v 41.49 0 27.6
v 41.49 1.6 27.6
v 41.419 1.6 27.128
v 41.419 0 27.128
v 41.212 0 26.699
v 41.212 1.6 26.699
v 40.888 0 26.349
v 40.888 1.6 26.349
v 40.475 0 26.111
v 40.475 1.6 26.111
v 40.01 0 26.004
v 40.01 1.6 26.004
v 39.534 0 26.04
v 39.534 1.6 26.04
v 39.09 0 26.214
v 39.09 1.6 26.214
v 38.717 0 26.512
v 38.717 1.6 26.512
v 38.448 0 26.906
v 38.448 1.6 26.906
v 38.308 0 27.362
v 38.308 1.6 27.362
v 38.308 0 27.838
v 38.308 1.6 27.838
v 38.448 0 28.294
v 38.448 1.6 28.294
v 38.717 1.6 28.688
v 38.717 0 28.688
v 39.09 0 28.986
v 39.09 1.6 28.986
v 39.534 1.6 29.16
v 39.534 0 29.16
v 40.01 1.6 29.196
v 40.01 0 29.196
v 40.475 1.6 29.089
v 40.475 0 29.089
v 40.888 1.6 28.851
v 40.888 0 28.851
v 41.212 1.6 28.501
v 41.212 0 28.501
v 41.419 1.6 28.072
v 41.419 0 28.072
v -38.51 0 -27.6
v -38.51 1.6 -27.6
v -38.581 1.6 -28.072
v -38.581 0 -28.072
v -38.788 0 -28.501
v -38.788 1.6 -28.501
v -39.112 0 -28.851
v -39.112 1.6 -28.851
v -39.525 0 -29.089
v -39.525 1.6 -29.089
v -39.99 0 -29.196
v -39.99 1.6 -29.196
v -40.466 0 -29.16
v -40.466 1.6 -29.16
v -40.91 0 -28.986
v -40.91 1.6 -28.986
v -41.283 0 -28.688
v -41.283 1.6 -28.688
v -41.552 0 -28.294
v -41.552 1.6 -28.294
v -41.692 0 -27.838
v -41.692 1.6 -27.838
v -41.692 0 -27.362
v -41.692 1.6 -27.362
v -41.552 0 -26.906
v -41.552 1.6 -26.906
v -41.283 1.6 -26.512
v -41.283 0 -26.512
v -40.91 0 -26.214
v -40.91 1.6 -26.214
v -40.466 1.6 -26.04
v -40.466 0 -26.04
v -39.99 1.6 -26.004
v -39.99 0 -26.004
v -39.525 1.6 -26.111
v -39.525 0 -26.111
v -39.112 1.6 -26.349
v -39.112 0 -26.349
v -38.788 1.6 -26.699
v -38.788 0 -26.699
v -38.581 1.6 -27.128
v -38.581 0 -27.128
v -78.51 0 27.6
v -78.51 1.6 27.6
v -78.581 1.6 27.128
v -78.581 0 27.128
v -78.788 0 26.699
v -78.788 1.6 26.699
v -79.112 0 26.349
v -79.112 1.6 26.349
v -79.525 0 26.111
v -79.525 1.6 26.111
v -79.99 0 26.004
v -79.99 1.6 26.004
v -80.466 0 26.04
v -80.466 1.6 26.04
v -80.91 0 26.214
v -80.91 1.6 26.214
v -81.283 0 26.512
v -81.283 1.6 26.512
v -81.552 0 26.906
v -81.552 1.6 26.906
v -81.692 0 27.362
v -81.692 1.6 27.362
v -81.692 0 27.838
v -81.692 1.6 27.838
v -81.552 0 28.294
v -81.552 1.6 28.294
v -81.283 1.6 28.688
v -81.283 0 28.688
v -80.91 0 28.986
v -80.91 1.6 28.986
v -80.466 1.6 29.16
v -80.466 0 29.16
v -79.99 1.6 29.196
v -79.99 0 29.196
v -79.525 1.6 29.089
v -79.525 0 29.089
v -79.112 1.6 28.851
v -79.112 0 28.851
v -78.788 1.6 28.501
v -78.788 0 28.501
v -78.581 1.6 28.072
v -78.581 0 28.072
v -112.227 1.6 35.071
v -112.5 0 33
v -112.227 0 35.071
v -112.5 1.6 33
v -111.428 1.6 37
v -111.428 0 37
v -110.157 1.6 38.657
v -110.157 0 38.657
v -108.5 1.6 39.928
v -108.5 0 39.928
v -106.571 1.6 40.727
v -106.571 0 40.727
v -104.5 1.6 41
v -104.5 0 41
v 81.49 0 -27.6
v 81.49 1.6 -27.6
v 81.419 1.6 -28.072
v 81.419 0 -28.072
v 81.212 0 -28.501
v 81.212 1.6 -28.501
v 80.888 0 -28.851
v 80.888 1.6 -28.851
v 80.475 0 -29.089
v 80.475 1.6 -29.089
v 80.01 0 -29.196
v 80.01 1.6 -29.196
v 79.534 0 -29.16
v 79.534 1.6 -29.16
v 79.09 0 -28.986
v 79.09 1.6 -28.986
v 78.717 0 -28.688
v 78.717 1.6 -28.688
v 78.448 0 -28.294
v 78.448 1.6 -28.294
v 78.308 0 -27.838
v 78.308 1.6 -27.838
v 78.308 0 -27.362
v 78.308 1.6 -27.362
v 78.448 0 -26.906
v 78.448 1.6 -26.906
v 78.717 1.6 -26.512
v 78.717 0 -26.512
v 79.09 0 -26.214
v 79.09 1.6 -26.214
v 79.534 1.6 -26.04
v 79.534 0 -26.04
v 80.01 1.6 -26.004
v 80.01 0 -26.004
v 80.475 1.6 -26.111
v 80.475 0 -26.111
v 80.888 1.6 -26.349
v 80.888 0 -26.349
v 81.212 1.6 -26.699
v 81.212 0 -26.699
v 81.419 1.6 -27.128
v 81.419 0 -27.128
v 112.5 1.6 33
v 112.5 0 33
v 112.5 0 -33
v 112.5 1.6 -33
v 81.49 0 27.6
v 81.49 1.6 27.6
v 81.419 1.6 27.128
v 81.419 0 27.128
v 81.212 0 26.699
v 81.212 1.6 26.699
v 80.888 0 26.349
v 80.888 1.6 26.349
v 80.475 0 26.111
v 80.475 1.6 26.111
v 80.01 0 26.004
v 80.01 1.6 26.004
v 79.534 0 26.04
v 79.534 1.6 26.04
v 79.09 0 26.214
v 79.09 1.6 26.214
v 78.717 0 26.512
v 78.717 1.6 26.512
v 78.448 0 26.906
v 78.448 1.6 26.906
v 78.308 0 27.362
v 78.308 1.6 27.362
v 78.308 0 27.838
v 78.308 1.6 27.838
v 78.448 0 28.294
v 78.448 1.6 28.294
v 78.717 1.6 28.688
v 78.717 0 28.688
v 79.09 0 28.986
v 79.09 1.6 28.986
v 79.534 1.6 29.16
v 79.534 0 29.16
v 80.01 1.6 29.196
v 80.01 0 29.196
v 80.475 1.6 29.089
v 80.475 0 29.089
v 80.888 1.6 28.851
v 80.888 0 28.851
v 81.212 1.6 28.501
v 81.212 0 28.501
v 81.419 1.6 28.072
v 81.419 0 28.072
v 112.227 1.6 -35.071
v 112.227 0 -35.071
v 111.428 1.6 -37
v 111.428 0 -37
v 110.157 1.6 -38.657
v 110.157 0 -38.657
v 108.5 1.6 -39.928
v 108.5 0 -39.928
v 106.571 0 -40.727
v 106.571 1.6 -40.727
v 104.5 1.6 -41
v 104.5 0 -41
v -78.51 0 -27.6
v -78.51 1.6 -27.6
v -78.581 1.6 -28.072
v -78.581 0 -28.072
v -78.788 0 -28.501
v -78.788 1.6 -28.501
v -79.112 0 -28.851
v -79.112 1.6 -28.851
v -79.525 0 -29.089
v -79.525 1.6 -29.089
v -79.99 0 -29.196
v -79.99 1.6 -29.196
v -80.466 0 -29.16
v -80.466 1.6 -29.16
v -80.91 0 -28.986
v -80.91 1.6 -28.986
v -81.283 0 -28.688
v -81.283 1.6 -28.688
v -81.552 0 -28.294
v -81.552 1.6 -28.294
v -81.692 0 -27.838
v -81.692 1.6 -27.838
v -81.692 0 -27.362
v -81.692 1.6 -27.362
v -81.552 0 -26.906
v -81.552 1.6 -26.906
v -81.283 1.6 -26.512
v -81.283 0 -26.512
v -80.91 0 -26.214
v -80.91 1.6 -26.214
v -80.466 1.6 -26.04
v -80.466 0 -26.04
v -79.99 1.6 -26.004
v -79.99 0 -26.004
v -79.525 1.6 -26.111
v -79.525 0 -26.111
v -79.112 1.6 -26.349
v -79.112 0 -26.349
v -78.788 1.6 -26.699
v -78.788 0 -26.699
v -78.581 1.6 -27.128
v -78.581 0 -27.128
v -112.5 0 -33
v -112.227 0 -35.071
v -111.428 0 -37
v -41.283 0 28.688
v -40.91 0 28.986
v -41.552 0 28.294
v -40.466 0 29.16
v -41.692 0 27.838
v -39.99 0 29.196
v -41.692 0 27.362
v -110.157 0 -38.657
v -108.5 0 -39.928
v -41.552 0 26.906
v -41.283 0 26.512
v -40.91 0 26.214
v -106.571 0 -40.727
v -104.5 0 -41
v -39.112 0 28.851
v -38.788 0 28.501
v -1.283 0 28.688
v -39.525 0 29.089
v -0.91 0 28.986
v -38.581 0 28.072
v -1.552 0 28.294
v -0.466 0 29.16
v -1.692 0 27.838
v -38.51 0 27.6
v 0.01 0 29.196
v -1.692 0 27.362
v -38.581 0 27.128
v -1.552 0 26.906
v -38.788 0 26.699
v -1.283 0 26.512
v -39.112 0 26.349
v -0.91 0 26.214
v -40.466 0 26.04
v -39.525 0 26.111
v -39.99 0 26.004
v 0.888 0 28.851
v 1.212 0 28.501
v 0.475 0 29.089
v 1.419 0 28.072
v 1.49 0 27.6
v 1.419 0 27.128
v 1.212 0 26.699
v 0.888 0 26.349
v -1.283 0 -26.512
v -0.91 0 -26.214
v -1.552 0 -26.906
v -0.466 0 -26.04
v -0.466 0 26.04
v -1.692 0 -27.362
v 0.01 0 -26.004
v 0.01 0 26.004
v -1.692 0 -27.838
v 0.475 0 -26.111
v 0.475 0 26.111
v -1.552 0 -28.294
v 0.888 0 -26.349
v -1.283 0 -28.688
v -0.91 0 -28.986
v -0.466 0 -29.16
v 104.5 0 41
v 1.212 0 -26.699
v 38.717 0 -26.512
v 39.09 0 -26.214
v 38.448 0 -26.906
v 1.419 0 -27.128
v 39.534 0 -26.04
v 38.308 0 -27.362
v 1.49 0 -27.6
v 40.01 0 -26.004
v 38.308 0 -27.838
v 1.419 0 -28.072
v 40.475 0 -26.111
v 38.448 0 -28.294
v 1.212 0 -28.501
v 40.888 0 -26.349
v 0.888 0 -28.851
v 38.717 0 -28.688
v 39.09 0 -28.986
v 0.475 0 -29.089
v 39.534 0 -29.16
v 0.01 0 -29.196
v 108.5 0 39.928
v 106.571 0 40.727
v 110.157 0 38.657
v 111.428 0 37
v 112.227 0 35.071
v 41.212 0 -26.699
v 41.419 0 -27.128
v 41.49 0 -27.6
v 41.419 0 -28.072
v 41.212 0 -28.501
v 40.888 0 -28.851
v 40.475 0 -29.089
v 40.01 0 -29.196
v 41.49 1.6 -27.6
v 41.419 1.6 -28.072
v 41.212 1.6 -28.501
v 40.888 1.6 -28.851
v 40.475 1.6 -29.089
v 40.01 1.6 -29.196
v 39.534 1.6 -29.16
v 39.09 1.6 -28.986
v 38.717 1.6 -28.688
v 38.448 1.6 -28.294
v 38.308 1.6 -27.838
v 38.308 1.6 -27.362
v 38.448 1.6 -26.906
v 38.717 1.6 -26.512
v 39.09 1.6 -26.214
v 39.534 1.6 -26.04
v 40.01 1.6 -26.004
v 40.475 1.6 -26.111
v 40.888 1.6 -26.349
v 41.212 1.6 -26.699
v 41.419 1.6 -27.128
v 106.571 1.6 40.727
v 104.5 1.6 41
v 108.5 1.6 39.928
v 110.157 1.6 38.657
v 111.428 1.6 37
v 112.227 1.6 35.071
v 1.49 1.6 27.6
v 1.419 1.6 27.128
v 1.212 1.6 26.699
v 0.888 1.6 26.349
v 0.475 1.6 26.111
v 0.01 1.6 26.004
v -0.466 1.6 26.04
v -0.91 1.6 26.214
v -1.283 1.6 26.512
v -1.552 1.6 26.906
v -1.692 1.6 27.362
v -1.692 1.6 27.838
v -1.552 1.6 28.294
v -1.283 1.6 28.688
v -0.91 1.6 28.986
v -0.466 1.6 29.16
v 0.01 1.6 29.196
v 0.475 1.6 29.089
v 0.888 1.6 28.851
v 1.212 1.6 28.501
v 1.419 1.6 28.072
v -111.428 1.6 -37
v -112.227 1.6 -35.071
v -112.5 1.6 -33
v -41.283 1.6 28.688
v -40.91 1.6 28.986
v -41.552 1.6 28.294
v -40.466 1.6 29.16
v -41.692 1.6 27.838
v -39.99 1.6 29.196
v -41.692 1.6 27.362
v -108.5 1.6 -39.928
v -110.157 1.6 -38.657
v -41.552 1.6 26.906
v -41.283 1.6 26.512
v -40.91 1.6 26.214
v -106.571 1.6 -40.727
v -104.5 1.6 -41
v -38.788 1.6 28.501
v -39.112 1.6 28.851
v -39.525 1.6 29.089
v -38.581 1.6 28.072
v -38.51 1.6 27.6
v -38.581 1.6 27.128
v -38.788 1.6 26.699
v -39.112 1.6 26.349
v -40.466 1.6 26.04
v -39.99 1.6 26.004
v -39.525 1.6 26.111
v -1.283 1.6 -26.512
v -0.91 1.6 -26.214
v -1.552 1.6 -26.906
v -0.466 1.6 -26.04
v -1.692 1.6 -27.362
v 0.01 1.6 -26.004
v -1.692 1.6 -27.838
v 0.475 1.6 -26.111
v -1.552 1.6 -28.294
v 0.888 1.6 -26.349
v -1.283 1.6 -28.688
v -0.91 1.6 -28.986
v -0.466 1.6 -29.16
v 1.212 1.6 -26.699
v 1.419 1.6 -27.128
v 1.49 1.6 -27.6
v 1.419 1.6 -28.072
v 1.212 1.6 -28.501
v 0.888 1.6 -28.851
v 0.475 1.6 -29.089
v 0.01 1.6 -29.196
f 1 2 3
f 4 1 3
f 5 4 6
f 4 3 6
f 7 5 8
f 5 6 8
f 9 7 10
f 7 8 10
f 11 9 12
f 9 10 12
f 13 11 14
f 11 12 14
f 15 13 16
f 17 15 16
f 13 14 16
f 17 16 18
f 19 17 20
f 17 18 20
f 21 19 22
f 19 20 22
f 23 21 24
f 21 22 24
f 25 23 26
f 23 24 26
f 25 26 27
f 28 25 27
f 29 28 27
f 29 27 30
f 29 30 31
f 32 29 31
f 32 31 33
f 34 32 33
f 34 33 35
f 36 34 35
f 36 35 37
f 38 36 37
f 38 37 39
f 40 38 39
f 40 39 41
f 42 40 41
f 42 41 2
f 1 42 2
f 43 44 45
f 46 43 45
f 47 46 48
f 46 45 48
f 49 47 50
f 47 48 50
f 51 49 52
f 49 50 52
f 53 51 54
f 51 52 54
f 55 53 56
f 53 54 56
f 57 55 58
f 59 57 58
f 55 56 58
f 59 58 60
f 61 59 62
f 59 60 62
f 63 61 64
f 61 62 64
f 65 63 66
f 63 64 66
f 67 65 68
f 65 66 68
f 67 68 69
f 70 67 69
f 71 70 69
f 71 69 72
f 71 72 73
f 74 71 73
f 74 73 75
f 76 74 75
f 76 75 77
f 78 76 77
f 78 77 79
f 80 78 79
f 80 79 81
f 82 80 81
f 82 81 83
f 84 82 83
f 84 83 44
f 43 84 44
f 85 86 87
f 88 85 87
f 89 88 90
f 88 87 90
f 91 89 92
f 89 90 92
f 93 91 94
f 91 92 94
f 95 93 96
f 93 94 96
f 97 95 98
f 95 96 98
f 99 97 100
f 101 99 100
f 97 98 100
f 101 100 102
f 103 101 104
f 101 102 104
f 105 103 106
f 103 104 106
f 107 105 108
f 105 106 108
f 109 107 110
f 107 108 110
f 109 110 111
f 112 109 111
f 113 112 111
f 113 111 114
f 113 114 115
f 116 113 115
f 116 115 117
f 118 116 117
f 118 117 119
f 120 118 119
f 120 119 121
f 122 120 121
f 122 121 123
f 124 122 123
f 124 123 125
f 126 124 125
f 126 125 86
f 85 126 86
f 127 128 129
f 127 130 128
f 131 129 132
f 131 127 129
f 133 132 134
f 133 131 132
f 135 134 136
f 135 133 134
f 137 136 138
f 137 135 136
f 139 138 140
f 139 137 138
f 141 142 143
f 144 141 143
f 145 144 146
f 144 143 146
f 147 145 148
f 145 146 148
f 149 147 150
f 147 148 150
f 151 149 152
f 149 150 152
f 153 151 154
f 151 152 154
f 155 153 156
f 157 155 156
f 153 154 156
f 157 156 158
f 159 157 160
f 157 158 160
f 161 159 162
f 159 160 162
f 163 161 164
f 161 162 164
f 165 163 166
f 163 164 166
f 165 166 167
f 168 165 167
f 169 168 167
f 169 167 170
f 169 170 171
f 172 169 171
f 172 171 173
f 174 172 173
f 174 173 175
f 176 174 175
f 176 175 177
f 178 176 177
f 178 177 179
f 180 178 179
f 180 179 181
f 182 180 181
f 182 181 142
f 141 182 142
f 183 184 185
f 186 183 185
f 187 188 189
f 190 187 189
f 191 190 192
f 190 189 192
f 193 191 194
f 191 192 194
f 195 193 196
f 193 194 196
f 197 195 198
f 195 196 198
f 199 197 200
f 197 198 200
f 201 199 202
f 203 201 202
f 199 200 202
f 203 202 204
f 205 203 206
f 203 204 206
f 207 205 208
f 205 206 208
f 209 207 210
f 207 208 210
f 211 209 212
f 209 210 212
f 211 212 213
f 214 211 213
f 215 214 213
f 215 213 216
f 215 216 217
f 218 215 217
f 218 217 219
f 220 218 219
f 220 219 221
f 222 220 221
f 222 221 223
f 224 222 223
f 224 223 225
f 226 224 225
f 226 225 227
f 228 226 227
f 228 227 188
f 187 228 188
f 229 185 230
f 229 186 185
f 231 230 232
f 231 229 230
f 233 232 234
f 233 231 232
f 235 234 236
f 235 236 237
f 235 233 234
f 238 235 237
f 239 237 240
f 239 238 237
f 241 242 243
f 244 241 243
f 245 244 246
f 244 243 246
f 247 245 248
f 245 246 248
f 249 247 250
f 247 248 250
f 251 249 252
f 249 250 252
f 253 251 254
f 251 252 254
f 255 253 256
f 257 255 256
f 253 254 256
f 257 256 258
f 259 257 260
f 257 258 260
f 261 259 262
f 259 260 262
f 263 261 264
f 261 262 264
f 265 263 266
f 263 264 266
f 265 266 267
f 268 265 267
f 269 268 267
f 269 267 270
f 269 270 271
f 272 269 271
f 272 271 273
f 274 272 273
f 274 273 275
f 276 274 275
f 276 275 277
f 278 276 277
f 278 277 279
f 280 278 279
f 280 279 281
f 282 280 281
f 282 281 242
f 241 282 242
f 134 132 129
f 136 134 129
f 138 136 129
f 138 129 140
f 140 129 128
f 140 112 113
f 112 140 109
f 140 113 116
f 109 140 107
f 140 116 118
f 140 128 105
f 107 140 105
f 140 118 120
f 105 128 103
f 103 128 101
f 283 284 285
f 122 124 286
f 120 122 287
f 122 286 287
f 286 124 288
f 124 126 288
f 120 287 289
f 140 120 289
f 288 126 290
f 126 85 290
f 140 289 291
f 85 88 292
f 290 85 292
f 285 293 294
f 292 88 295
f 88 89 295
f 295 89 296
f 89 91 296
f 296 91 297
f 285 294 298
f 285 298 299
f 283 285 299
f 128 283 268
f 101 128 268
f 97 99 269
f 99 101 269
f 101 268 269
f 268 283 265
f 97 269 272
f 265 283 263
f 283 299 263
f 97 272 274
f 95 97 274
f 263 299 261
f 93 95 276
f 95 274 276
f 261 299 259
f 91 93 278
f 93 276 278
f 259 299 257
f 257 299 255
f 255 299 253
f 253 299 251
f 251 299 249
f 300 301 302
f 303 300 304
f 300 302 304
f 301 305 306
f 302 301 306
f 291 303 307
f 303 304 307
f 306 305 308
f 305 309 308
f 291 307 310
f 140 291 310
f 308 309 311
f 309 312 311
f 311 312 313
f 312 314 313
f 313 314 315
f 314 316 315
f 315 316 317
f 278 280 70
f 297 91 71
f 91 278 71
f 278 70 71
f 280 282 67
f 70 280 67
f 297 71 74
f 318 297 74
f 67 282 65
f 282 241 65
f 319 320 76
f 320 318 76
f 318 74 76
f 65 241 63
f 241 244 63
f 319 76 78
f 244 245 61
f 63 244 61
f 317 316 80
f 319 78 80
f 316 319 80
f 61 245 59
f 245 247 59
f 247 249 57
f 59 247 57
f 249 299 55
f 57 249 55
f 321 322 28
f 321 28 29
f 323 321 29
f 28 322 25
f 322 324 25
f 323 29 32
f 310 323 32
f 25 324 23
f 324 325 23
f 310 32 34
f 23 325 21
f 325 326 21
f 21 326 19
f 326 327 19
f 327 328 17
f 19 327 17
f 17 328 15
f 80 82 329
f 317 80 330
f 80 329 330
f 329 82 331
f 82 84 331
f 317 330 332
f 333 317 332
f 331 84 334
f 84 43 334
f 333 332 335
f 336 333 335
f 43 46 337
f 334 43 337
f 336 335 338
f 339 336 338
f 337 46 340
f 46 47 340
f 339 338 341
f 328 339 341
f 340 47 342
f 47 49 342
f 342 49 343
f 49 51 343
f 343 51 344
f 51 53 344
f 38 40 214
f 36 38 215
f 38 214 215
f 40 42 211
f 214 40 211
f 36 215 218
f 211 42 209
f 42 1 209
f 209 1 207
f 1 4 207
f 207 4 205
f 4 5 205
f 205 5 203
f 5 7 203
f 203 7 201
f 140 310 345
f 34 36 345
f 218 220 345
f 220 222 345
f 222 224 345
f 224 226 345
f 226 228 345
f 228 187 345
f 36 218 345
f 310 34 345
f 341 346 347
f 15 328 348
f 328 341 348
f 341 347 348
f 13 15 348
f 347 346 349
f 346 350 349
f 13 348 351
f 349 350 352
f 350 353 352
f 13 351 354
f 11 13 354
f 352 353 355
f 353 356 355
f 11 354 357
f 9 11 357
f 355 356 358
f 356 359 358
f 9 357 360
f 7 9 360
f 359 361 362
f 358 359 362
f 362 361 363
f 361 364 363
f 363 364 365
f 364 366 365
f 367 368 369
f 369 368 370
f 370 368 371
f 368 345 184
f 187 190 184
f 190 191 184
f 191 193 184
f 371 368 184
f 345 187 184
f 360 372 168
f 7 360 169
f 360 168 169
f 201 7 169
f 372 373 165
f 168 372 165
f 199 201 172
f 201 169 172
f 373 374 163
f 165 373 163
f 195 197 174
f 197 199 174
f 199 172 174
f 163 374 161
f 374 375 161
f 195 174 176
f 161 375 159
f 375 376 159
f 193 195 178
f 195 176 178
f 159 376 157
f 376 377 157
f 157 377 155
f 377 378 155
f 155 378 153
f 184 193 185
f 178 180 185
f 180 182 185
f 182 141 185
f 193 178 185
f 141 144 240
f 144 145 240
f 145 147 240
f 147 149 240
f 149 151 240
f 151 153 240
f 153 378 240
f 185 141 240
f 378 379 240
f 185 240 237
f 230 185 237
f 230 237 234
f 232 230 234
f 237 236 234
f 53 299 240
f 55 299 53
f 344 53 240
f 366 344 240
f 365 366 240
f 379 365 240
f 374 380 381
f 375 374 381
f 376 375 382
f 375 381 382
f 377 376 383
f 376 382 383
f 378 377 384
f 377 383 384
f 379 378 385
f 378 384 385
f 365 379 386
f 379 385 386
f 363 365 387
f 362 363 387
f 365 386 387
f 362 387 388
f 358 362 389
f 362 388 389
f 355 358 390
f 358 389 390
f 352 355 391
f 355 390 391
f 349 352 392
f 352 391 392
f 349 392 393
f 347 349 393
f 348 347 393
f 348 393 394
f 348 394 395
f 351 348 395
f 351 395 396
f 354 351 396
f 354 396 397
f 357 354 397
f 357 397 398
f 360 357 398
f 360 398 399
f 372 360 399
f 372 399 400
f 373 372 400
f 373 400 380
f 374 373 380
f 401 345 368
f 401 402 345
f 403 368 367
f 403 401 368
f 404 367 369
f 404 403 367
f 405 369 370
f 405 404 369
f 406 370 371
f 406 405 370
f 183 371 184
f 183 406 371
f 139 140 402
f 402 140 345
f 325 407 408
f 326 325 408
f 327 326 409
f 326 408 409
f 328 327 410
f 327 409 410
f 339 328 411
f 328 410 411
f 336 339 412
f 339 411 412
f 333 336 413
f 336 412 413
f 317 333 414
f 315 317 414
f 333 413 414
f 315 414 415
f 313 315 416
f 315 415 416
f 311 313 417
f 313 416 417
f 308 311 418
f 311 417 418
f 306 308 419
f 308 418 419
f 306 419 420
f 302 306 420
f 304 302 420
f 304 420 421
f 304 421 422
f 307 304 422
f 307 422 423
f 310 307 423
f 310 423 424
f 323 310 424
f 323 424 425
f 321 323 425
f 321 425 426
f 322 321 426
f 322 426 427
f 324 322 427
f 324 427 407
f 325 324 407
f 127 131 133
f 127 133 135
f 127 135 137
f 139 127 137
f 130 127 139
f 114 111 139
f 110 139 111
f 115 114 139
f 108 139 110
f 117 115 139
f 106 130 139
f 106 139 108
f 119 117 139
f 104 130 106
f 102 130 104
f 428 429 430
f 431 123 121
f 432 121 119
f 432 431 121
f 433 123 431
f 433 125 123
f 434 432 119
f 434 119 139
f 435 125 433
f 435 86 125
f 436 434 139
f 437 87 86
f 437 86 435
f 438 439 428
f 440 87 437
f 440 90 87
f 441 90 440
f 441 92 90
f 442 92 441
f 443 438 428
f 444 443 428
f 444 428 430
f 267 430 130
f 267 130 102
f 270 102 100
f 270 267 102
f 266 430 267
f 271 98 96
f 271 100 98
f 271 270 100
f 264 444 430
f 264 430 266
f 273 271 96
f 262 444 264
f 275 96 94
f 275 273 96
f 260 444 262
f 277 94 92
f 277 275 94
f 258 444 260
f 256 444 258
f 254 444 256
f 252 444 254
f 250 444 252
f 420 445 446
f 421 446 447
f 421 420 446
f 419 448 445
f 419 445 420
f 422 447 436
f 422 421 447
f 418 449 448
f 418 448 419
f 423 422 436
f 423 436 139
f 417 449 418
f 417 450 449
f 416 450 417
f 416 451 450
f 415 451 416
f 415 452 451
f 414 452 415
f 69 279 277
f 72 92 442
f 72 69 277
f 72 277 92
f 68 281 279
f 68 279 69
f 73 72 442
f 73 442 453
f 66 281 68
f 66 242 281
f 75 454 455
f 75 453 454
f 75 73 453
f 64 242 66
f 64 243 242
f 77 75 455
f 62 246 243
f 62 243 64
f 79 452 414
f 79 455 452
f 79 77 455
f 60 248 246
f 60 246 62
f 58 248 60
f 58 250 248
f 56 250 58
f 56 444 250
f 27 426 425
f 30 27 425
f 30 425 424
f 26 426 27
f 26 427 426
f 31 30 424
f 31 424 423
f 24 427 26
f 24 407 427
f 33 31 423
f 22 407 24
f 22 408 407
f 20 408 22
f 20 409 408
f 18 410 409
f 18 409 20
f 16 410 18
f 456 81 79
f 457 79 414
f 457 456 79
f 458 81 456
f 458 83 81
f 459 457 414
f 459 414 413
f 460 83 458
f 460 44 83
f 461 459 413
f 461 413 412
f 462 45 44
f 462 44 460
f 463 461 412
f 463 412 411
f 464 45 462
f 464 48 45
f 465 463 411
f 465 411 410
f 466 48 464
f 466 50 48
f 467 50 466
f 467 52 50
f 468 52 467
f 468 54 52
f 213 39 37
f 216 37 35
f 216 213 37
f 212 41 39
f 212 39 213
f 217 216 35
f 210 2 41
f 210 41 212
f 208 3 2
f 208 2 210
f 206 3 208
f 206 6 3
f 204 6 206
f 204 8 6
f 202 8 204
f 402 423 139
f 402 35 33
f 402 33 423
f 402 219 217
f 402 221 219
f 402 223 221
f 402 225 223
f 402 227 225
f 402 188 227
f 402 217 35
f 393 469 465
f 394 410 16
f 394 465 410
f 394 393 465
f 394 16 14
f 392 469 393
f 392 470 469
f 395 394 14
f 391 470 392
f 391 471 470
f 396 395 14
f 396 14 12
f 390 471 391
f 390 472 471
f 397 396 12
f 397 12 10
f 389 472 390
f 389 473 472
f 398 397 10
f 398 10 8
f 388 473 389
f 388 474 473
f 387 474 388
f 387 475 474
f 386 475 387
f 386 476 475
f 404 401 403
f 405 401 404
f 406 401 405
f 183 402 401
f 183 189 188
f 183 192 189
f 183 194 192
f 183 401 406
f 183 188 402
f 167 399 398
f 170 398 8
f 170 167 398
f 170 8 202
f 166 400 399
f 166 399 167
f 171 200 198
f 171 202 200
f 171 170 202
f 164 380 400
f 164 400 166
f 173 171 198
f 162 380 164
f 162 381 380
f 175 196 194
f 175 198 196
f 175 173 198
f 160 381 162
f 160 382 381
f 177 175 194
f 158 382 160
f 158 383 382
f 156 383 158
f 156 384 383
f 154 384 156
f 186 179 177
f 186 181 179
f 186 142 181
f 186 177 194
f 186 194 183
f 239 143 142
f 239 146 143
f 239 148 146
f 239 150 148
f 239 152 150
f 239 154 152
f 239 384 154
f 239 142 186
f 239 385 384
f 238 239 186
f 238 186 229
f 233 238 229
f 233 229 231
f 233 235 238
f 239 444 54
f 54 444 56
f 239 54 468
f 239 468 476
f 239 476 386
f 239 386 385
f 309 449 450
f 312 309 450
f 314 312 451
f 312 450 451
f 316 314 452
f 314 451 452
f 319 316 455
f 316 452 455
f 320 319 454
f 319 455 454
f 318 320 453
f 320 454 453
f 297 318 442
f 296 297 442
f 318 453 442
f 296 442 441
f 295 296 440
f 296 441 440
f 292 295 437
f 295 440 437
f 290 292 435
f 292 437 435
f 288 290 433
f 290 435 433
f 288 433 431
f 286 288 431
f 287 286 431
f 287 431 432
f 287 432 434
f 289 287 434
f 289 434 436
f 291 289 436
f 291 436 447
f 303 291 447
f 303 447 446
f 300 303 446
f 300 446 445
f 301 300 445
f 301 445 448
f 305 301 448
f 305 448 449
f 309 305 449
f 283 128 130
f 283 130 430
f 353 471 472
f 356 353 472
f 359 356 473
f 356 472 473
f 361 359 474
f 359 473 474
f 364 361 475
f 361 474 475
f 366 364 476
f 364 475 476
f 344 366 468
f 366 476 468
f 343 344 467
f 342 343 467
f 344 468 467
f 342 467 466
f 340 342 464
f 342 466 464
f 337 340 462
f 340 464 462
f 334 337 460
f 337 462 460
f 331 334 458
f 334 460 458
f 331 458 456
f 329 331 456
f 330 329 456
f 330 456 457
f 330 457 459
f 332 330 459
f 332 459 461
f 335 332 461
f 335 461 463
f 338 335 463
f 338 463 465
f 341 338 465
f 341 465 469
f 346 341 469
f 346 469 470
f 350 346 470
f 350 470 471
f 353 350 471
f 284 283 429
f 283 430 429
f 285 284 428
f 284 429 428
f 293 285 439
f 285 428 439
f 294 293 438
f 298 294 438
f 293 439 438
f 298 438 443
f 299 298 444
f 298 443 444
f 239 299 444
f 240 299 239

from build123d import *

# Parameters (mm, degrees)
SKETCH1_W               = 225
SKETCH1_H               = 82
BOSS_EXTRUDE1_DEPTH     = 1.6
FILLET1_R               = 8
SKETCH2_R               = 1.6
CUT_EXTRUDE1_DEPTH      = 1
CUT_EXTRUDE1_DEPTH_BACK = 2.6


with BuildPart() as part:
    # Sketch1 → Boss-Extrude1 (new body)
    with BuildSketch(Plane(origin=(0, 0, 0), x_dir=(1, 0, 0), z_dir=(0, 1, 0))):
        Rectangle(SKETCH1_W, SKETCH1_H)
    extrude(amount=BOSS_EXTRUDE1_DEPTH)

    # Fillet1
    fillet1_edges = [part.edges().sort_by_distance(p)[0] for p in [
        (112.5, 0.8, 41),
        (-112.5, 0.8, 41),
        (-112.5, 0.8, -41),
        (112.5, 0.8, -41),
    ]]
    fillet(fillet1_edges, radius=FILLET1_R)

    # Sketch2 → Cut-Extrude1 (cut, two sides)
    with BuildSketch(Plane(origin=(0, 1.6, 0), x_dir=(1, 0, 0), z_dir=(0, 1, 0))) as cut_extrude1_sk:
        with Locations((-80.11, 27.6)):
            Circle(SKETCH2_R)
        with Locations((-80.11, -27.6)):
            Circle(SKETCH2_R)
        with Locations((-40.11, 27.6)):
            Circle(SKETCH2_R)
        with Locations((-0.11, 27.6)):
            Circle(SKETCH2_R)
        with Locations((39.89, 27.6)):
            Circle(SKETCH2_R)
        with Locations((-40.11, -27.6)):
            Circle(SKETCH2_R)
        with Locations((-0.11, -27.6)):
            Circle(SKETCH2_R)
        with Locations((39.89, -27.6)):
            Circle(SKETCH2_R)
        with Locations((79.89, -27.6)):
            Circle(SKETCH2_R)
        with Locations((79.89, 27.6)):
            Circle(SKETCH2_R)
    extrude(amount=CUT_EXTRUDE1_DEPTH, mode=Mode.SUBTRACT)
    extrude(cut_extrude1_sk.sketch, amount=-CUT_EXTRUDE1_DEPTH_BACK, mode=Mode.SUBTRACT)


solid = part.part
